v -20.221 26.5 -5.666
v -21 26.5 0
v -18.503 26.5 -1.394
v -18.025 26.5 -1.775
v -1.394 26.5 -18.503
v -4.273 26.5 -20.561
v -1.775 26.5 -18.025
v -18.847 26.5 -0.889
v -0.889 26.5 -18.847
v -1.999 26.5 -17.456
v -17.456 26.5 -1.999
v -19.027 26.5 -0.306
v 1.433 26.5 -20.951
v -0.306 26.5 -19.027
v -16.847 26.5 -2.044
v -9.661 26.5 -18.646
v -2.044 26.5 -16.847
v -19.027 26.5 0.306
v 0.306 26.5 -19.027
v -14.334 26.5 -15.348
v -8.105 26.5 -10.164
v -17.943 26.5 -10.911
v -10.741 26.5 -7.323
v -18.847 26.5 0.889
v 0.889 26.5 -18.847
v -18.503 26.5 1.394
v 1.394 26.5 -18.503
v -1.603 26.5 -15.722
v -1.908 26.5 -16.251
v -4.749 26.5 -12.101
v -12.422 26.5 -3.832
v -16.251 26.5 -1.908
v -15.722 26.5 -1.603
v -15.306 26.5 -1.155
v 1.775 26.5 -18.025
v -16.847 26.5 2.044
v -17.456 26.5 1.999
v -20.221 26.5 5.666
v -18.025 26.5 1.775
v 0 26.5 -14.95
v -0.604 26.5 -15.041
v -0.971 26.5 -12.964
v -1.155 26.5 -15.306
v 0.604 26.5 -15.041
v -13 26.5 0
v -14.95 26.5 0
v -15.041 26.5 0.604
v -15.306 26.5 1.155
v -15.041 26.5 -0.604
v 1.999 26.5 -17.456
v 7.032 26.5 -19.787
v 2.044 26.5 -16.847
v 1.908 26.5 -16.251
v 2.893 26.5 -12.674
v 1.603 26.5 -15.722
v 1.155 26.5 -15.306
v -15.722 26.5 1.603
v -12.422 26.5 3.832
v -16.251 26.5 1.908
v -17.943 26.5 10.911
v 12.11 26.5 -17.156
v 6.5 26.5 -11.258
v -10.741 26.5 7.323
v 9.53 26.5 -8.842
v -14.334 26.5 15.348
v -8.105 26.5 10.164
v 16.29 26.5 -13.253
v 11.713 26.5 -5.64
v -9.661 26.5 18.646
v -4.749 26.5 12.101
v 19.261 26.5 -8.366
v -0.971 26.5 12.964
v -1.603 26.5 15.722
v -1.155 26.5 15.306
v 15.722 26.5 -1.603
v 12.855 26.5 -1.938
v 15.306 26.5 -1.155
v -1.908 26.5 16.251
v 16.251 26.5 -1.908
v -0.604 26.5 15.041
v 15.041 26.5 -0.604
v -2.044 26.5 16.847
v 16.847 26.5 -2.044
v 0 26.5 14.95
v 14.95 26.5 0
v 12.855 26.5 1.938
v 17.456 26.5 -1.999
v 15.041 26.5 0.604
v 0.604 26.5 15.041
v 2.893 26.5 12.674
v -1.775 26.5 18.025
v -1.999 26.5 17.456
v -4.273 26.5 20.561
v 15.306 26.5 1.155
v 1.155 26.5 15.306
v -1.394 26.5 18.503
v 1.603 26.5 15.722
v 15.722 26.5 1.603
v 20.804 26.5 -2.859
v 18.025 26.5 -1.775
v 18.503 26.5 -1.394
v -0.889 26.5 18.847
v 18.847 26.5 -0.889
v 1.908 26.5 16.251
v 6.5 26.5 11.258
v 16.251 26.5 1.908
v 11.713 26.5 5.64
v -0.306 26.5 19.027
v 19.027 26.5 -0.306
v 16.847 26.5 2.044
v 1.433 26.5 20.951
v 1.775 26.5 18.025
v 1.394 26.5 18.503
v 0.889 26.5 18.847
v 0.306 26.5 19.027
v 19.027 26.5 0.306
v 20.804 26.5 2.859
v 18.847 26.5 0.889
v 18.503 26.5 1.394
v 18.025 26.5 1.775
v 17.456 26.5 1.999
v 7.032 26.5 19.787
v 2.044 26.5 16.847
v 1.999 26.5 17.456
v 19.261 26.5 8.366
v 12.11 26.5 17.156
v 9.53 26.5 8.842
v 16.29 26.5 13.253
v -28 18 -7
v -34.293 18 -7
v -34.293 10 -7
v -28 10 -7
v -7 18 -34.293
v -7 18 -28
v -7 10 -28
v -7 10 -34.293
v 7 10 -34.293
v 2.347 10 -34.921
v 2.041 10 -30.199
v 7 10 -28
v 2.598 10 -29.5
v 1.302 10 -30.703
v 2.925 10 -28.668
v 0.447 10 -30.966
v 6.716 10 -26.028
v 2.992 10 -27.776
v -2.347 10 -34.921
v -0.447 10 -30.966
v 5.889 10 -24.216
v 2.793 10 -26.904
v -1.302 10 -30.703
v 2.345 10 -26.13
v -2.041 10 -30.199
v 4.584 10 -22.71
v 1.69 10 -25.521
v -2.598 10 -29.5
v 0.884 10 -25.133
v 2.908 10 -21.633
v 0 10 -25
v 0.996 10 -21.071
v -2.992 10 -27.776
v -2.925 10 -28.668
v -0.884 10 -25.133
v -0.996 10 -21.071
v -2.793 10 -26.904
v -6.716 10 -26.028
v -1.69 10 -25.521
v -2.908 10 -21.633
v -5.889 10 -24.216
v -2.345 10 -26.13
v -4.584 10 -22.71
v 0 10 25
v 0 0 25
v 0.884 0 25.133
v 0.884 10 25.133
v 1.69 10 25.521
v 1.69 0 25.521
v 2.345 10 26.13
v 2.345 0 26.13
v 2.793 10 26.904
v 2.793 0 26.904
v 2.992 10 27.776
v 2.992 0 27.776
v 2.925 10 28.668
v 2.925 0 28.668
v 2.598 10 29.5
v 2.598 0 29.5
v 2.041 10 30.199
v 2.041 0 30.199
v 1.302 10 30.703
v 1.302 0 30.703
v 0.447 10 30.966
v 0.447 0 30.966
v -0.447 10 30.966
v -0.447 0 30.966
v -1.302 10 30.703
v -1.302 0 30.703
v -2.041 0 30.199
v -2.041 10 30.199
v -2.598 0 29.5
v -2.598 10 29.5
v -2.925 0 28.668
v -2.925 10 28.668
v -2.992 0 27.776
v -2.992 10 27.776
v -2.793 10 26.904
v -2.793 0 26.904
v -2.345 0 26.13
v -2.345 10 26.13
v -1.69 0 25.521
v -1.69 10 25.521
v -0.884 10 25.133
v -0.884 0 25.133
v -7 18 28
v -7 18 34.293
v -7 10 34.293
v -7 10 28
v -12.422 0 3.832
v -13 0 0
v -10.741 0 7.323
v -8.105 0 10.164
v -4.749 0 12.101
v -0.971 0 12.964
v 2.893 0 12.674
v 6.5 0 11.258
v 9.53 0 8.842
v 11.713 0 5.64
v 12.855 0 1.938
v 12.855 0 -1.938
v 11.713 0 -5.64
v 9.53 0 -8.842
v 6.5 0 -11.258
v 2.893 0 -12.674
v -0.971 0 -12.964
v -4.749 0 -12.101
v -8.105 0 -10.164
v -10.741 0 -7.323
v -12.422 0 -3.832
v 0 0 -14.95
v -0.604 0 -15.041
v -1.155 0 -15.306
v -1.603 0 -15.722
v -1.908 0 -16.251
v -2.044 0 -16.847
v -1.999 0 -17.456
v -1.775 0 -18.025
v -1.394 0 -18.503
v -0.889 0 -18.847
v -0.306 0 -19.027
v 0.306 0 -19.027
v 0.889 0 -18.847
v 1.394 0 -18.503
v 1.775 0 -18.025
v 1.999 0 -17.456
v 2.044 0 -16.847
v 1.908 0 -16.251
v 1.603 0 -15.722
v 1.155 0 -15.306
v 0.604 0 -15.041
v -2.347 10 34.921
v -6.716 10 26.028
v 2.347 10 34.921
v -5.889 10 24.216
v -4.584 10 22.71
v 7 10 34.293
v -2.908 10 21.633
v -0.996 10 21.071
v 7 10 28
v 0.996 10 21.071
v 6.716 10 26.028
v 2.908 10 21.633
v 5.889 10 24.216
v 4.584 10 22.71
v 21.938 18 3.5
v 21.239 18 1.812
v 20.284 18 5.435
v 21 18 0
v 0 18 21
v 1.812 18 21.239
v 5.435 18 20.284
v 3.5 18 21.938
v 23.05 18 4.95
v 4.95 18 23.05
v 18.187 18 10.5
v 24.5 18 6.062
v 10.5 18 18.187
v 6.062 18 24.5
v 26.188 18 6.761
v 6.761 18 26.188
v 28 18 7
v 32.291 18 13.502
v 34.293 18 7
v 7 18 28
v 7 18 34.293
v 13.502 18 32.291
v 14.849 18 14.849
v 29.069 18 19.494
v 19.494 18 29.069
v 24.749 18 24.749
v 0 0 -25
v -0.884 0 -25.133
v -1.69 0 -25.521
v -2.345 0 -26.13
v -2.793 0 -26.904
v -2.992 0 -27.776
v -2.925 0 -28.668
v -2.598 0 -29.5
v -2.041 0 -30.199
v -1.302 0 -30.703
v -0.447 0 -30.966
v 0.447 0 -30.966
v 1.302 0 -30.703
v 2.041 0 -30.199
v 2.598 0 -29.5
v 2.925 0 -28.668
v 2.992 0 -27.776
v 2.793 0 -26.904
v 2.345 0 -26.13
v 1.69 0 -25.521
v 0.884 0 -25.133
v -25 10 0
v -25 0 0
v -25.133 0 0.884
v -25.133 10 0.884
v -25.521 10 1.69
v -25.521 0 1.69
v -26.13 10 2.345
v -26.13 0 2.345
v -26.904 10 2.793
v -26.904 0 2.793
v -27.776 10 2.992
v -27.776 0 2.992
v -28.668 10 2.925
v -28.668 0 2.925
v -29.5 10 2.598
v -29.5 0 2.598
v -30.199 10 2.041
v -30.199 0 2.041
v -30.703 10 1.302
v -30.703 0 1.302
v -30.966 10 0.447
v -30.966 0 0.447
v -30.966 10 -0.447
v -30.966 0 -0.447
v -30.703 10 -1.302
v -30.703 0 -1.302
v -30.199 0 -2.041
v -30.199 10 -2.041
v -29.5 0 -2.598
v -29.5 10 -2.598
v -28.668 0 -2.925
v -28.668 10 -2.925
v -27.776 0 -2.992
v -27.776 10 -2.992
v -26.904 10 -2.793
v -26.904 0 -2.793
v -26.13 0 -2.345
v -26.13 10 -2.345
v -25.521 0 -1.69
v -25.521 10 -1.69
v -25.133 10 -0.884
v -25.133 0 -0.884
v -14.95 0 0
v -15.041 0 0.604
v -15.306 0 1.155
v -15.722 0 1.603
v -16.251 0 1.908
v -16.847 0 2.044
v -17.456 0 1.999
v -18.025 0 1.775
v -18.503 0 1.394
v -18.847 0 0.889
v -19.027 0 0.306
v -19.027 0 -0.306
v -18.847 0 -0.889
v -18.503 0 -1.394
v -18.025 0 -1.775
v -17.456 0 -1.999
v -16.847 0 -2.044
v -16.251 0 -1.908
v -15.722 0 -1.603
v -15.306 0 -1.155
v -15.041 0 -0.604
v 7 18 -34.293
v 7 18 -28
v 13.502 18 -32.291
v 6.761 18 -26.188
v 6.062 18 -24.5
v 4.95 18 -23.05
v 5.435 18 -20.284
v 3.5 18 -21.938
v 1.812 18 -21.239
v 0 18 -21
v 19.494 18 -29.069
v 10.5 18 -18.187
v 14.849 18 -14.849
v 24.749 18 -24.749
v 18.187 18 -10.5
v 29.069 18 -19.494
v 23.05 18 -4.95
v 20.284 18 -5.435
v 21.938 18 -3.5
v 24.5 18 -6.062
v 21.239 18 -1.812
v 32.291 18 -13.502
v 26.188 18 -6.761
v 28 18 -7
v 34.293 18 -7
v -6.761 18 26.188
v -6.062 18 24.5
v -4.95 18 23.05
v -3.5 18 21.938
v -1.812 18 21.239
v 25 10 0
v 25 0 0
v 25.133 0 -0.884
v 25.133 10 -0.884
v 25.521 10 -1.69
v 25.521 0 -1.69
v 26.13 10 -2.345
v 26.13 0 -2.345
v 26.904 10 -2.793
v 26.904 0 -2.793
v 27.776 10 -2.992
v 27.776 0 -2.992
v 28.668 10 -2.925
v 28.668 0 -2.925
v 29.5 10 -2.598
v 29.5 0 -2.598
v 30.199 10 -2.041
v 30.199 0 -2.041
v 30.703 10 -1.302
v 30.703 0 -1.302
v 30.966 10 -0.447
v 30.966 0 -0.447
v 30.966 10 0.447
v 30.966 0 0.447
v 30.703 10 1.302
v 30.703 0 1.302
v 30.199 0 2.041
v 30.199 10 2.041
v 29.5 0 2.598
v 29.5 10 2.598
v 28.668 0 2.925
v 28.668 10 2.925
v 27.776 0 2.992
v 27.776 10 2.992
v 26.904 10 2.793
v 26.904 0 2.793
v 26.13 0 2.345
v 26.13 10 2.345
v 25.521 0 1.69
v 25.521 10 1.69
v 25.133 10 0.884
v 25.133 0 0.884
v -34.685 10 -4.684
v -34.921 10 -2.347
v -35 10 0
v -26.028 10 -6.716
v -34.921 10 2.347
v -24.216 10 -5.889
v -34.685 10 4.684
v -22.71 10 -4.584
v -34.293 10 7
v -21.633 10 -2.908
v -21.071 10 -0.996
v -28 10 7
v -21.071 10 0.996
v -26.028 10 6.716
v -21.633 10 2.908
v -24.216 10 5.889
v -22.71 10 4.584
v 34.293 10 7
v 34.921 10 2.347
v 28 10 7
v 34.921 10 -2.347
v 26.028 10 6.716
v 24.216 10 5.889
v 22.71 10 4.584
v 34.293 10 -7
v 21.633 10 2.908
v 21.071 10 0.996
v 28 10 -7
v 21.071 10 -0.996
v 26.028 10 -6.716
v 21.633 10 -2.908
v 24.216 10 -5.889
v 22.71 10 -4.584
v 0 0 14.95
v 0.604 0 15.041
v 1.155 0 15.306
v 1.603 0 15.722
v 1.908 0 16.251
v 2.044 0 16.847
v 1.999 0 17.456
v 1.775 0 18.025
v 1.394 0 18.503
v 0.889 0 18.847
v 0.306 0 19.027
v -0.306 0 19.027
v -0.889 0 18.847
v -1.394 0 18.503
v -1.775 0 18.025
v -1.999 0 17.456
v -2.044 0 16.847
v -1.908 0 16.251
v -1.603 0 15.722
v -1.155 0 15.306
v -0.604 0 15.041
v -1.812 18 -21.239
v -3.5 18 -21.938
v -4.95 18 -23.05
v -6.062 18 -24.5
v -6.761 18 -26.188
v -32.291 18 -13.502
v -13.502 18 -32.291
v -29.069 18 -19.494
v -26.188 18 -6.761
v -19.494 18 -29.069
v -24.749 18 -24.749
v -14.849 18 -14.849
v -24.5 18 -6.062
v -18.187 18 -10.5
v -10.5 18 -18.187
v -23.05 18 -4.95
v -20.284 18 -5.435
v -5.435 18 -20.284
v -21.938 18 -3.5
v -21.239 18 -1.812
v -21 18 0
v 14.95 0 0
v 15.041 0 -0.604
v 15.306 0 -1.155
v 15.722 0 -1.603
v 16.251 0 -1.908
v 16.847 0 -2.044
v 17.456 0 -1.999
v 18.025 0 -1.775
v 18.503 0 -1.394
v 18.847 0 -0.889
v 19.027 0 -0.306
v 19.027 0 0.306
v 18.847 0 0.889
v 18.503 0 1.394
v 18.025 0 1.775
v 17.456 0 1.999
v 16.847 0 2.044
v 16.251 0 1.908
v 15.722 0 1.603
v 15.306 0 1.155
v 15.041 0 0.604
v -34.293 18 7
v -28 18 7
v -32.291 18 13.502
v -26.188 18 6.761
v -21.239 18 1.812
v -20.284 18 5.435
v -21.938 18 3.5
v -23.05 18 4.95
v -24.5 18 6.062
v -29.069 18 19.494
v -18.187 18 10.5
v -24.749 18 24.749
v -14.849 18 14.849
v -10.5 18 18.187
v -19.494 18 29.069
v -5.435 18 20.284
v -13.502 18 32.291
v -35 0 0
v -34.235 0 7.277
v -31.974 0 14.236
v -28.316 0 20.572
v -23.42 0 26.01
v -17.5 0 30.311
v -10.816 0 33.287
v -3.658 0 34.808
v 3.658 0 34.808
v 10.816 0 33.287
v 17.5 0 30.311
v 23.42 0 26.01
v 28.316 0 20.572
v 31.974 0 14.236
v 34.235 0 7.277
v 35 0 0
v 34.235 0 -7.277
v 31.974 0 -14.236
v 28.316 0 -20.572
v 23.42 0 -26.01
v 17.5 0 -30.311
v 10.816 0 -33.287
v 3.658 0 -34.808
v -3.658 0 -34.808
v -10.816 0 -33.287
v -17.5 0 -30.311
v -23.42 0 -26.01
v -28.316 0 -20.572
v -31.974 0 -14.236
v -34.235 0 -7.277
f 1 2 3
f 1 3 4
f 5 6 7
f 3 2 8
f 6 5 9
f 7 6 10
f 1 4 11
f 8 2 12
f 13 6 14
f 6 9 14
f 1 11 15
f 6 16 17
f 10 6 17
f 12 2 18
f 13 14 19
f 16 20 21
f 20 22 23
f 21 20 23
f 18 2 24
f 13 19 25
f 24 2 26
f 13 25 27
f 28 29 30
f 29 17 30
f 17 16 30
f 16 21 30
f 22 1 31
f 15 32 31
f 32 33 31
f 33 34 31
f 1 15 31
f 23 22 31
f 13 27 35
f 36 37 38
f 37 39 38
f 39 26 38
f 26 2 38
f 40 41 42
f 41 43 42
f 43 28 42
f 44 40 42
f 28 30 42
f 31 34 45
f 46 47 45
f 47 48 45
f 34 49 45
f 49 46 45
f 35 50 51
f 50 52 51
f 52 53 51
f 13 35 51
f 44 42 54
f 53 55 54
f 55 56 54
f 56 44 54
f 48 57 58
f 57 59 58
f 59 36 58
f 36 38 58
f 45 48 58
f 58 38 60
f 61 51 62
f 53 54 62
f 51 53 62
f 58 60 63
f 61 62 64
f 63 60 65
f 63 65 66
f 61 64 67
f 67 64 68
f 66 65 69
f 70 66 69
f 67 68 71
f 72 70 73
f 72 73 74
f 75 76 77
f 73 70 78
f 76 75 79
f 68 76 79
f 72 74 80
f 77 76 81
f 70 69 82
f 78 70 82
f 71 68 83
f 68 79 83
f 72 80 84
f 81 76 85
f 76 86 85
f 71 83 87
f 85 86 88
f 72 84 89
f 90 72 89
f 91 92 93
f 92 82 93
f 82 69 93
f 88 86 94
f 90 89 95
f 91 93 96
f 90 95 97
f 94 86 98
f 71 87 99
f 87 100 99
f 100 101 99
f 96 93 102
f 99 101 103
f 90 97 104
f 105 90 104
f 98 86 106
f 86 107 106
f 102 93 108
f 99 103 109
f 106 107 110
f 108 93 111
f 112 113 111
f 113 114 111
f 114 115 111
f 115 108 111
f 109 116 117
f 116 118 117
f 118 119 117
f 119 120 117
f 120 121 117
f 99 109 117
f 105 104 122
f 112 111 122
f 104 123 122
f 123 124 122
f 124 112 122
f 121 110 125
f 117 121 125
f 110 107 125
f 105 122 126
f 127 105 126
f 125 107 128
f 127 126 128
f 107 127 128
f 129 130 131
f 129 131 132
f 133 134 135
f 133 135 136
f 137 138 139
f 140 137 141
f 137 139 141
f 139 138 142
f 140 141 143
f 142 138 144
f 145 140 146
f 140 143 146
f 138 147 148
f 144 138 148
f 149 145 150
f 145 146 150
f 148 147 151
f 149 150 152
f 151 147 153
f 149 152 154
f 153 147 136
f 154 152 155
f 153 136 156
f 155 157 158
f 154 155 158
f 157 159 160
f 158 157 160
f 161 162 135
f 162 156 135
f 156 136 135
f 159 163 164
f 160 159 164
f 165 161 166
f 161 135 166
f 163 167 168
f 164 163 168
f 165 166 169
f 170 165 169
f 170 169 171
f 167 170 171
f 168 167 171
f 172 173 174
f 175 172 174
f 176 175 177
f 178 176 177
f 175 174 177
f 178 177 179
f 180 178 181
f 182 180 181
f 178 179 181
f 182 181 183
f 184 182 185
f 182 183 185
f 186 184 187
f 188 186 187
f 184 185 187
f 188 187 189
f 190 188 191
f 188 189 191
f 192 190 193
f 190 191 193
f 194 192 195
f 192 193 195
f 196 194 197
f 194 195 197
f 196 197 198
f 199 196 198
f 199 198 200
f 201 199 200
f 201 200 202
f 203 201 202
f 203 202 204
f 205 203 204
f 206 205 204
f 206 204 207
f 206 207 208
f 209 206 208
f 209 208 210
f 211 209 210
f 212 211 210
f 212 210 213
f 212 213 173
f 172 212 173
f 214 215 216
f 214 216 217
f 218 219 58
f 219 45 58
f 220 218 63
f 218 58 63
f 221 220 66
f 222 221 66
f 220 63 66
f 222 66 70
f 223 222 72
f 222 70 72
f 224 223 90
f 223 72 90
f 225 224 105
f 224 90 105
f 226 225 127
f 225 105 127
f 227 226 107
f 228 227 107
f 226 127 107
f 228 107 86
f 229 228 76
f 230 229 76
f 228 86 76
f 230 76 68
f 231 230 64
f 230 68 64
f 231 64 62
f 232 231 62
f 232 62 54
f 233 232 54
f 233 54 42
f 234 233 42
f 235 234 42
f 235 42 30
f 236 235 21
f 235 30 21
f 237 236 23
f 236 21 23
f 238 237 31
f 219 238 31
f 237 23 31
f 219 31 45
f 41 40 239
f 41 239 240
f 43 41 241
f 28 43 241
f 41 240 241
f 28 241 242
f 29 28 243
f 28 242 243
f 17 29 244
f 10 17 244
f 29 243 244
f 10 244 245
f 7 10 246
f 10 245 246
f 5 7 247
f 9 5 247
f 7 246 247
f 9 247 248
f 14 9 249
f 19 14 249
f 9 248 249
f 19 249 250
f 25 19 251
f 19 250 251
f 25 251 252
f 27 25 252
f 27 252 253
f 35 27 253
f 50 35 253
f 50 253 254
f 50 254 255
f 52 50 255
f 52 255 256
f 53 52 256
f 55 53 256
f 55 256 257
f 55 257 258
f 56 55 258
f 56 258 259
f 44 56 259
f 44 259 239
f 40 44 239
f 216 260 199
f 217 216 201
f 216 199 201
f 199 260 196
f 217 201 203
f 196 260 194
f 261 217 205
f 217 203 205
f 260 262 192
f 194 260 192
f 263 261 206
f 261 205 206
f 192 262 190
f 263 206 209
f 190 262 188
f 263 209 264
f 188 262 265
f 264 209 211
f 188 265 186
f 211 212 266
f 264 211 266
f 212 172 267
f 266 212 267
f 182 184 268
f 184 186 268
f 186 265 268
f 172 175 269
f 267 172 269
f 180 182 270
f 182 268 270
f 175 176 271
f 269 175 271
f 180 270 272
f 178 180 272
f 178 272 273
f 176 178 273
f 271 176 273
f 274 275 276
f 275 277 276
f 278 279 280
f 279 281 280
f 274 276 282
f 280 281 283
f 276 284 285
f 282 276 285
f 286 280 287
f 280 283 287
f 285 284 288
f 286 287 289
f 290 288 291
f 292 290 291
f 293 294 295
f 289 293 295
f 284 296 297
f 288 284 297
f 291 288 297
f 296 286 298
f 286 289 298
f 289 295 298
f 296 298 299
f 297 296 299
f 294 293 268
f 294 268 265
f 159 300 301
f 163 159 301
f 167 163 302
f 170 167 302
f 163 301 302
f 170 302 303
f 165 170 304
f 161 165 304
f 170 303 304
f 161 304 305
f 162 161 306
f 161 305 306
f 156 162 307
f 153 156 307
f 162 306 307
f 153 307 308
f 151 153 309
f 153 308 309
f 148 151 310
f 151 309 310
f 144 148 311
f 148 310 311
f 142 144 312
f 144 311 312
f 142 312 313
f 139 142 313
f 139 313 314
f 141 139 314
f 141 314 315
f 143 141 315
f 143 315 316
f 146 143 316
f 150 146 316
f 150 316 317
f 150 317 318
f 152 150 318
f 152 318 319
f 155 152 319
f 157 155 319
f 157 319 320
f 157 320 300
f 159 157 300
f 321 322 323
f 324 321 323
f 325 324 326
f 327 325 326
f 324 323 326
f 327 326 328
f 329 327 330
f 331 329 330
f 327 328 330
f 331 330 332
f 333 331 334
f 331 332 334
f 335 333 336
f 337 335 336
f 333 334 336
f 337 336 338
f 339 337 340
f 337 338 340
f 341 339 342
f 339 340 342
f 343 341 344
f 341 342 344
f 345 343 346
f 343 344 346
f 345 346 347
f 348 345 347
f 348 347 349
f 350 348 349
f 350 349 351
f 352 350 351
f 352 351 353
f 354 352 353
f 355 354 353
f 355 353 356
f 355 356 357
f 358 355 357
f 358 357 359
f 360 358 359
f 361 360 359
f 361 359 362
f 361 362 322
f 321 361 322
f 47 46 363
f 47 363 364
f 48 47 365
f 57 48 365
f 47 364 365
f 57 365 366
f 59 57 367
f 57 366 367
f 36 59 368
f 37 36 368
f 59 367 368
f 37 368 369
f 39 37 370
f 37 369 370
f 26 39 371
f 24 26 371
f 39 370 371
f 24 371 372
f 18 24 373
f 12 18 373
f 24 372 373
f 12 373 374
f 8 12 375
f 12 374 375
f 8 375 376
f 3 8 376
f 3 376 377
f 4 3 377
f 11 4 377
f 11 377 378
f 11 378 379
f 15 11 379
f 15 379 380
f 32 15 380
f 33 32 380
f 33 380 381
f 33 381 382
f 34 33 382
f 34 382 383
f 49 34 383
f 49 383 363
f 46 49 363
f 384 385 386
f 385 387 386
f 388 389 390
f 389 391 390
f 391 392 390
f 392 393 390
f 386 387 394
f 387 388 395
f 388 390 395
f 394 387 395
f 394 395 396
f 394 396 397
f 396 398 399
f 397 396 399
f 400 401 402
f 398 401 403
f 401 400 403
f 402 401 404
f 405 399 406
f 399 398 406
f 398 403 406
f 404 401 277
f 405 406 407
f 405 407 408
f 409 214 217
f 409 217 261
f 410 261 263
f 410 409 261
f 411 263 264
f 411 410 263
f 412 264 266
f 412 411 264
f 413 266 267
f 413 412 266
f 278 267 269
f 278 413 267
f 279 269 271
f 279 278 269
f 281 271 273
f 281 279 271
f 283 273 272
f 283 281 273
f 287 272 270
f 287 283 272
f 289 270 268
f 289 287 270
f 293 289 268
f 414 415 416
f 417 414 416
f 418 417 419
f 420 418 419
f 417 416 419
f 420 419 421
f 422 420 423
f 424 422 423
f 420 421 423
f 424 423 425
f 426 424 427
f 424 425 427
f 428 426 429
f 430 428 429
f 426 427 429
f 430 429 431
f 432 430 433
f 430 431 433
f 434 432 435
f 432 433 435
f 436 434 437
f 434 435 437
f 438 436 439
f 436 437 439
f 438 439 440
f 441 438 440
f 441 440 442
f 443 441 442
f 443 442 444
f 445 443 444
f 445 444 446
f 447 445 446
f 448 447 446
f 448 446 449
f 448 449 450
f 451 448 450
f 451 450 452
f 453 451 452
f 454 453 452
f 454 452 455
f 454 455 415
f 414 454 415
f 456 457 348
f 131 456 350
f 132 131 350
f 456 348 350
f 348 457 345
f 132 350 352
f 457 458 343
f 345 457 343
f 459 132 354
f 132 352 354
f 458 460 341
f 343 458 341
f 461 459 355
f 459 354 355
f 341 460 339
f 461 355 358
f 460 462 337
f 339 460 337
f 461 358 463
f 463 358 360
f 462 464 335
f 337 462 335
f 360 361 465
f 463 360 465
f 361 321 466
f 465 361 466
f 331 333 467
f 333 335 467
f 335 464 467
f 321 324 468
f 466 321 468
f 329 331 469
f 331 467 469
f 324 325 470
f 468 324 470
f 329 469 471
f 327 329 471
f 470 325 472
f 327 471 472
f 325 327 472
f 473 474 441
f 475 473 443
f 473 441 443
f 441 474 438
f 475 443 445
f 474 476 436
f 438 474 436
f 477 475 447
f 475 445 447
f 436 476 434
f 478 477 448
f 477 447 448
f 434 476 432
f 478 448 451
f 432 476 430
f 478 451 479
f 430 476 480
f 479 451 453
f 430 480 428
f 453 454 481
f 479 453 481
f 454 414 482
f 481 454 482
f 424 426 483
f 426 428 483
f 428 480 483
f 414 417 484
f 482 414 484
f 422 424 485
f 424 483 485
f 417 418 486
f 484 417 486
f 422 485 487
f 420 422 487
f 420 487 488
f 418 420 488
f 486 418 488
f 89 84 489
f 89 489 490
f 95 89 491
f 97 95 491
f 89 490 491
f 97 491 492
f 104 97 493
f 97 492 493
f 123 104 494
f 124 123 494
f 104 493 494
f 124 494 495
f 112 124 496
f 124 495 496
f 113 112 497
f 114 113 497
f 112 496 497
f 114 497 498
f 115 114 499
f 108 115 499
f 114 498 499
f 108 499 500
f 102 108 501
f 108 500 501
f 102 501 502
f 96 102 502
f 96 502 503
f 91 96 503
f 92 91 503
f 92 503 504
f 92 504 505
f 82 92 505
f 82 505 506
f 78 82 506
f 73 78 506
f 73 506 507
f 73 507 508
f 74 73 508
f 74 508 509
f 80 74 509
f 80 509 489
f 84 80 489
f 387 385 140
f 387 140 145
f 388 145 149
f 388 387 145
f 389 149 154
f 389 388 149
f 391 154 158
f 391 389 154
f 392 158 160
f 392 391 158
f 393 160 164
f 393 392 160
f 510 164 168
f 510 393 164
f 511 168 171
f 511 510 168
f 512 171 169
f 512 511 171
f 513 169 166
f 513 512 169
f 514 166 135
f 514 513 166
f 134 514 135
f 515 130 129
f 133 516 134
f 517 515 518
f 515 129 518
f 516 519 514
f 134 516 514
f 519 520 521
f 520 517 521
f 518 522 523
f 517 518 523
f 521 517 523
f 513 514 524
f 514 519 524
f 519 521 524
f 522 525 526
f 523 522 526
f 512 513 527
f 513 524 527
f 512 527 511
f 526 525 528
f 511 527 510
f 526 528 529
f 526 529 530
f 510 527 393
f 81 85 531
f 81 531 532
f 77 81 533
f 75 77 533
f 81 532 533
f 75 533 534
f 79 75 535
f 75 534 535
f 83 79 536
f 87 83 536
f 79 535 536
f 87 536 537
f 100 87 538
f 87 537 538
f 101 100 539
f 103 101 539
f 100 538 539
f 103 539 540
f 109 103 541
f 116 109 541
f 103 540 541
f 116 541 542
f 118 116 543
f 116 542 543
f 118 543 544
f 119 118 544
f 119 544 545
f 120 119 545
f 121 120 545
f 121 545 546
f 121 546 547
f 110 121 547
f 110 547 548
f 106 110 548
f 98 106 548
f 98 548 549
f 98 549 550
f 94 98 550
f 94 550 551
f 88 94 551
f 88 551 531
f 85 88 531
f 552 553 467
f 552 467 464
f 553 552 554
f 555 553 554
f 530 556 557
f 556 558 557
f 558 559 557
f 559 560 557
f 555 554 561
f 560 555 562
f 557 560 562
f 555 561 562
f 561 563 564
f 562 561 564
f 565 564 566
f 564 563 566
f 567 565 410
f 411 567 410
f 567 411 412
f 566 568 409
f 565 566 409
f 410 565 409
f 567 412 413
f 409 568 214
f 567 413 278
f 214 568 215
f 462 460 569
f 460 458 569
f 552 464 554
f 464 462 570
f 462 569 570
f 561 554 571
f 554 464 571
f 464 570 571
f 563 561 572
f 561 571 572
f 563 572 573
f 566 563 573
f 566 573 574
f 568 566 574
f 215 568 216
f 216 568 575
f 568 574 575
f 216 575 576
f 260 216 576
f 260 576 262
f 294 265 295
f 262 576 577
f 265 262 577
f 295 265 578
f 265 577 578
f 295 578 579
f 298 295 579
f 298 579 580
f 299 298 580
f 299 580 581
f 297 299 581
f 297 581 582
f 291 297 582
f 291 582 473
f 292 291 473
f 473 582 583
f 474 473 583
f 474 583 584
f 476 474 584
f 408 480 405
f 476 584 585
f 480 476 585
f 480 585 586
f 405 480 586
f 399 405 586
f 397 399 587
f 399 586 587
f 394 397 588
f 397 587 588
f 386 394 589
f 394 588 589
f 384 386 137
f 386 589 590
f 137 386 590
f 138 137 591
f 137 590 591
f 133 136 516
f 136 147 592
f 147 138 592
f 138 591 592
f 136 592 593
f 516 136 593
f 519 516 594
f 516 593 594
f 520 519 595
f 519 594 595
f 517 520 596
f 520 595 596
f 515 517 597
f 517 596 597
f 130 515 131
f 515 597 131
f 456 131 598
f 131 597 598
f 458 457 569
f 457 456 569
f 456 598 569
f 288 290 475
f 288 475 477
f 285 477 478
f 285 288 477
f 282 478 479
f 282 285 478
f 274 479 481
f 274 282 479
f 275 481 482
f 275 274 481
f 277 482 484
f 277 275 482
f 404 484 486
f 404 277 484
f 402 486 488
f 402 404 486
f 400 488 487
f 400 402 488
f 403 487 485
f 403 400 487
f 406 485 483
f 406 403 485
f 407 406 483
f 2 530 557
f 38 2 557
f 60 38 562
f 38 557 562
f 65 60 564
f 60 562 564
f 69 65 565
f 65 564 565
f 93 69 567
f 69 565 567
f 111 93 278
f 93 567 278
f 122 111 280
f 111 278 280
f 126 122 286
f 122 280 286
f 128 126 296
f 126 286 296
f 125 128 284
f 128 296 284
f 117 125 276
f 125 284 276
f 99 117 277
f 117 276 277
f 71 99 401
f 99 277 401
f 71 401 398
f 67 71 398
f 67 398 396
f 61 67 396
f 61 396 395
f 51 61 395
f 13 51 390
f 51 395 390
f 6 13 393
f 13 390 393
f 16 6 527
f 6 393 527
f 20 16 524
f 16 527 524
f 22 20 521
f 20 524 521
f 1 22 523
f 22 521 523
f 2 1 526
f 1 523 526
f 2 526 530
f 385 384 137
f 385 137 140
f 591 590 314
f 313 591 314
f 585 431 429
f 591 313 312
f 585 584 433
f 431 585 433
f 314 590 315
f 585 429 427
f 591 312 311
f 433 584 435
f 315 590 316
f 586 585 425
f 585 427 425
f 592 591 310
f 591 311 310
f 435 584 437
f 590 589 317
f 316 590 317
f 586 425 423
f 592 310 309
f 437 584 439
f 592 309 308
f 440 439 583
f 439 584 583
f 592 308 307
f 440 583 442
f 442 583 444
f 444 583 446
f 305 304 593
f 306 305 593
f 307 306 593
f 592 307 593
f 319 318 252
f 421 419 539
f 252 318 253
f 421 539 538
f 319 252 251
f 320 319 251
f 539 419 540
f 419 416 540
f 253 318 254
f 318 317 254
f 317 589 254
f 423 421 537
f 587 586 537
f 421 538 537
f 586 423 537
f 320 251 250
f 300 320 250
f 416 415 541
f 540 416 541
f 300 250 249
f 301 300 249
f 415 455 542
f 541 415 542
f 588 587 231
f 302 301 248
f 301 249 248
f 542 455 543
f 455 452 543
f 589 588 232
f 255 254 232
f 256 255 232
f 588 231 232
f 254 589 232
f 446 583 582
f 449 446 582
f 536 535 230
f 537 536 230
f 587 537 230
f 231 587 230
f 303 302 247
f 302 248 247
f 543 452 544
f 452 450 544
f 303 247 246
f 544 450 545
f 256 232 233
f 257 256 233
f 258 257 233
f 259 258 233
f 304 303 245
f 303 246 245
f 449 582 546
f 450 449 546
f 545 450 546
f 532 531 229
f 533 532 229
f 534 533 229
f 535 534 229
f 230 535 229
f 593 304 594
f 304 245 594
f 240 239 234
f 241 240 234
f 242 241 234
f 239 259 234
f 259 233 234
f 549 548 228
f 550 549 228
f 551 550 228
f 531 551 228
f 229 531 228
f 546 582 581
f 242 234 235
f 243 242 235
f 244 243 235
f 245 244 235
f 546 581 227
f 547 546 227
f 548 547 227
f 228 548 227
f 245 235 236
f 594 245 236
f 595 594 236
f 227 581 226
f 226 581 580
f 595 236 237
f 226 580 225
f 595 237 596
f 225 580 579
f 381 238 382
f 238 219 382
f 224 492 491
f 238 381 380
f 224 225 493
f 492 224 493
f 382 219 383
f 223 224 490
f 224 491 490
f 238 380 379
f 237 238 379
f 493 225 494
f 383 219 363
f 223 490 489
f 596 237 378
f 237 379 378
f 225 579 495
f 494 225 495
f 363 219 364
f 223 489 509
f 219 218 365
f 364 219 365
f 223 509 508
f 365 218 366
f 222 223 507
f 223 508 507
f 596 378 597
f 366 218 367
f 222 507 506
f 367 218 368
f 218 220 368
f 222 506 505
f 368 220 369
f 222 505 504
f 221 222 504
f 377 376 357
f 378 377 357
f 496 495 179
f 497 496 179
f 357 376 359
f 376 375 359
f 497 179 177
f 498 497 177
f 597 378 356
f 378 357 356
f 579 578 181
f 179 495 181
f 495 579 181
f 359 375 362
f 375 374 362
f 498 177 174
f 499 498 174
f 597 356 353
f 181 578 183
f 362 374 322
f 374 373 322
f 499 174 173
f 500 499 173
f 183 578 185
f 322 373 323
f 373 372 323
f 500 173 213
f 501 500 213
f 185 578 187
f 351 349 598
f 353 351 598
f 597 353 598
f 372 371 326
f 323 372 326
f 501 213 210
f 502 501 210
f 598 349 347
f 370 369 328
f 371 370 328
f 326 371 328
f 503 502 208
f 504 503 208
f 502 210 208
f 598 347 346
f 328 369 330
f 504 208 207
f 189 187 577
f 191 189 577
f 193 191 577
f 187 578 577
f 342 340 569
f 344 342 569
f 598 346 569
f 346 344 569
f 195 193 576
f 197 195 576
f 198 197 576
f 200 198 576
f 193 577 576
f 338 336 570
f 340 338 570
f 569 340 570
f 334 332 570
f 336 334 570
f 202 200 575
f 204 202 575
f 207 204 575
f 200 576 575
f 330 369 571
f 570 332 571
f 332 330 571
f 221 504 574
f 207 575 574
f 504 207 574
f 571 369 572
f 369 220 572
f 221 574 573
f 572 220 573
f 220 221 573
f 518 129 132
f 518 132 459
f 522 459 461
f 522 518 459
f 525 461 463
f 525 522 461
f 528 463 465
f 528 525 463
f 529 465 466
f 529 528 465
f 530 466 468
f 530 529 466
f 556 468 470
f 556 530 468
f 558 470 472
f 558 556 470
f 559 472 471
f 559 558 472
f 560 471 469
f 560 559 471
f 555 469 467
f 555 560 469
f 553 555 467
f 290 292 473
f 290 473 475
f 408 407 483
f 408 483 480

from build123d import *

# Parameters (mm, degrees)
HOLE_WIZARD_4_1_4_1_1_D     = 4.1
HOLE_WIZARD_4_1_4_1_1_DEPTH = 26.501
HOLE_WIZARD_6_0_6_1_D       = 6
HOLE_WIZARD_6_0_6_1_DEPTH   = 18.001
CUT_EXTRUDE_1_DEPTH         = 8
PATTERN_CIRCULAR_1_COUNT    = 4


with BuildPart() as part:
    # Эскиз1 → Повернуть1 (revolve)
    with BuildSketch(Plane.XY):
        Polygon((-13, 0), (-13, 26.5), (-21, 26.5), (-21, 18), (-35, 18), (-35, 0), align=None)
    revolve(axis=Axis((0, 0, 0), (0, 1, 0)))

    # Диаметр отверстия Ø4.1 (4.1)1
    with Locations(Plane(origin=(0, 26.5, 0), x_dir=(1, 0, 0), z_dir=(0, 1, 0))):
        with Locations((17, 0)):
            hole_wizard_4_1_4_1_1 = Hole(HOLE_WIZARD_4_1_4_1_1_D / 2, depth=HOLE_WIZARD_4_1_4_1_1_DEPTH)

    # Диаметр отверстия Ø6.0 (6)1
    with Locations(Plane(origin=(0, 18, 0), x_dir=(1, 0, 0), z_dir=(0, 1, 0))):
        with Locations((28, 0)):
            hole_wizard_6_0_6_1 = Hole(HOLE_WIZARD_6_0_6_1_D / 2, depth=HOLE_WIZARD_6_0_6_1_DEPTH)

    # Эскиз4 → Вырез-Вытянуть1 (cut)
    with BuildSketch(Plane(origin=(0, 18, 0), x_dir=(1, 0, 0), z_dir=(0, 1, 0))):
        with BuildLine():
            Line((28, 7), (48, 7))
            Line((48, 7), (48, -7))
            Line((48, -7), (28, -7))
            ThreePointArc((28, -7), (21, 0), (28, 7))
        make_face()
    cut_extrude_1 = extrude(amount=-CUT_EXTRUDE_1_DEPTH, mode=Mode.SUBTRACT)

    # Круговой массив1: Диаметр отверстия Ø4.1 (4.1)1, Диаметр отверстия Ø6.0 (6)1, Вырез-Вытянуть1 ×4 about axis
    pattern_circular_1_axis = Axis((0, 0, 0), (0, 1, 0))
    for i in range(1, PATTERN_CIRCULAR_1_COUNT):
        add(hole_wizard_4_1_4_1_1.rotate(pattern_circular_1_axis, i * 360 / PATTERN_CIRCULAR_1_COUNT), mode=Mode.SUBTRACT)
        add(hole_wizard_6_0_6_1.rotate(pattern_circular_1_axis, i * 360 / PATTERN_CIRCULAR_1_COUNT), mode=Mode.SUBTRACT)
        add(cut_extrude_1.rotate(pattern_circular_1_axis, i * 360 / PATTERN_CIRCULAR_1_COUNT), mode=Mode.SUBTRACT)


solid = part.part
